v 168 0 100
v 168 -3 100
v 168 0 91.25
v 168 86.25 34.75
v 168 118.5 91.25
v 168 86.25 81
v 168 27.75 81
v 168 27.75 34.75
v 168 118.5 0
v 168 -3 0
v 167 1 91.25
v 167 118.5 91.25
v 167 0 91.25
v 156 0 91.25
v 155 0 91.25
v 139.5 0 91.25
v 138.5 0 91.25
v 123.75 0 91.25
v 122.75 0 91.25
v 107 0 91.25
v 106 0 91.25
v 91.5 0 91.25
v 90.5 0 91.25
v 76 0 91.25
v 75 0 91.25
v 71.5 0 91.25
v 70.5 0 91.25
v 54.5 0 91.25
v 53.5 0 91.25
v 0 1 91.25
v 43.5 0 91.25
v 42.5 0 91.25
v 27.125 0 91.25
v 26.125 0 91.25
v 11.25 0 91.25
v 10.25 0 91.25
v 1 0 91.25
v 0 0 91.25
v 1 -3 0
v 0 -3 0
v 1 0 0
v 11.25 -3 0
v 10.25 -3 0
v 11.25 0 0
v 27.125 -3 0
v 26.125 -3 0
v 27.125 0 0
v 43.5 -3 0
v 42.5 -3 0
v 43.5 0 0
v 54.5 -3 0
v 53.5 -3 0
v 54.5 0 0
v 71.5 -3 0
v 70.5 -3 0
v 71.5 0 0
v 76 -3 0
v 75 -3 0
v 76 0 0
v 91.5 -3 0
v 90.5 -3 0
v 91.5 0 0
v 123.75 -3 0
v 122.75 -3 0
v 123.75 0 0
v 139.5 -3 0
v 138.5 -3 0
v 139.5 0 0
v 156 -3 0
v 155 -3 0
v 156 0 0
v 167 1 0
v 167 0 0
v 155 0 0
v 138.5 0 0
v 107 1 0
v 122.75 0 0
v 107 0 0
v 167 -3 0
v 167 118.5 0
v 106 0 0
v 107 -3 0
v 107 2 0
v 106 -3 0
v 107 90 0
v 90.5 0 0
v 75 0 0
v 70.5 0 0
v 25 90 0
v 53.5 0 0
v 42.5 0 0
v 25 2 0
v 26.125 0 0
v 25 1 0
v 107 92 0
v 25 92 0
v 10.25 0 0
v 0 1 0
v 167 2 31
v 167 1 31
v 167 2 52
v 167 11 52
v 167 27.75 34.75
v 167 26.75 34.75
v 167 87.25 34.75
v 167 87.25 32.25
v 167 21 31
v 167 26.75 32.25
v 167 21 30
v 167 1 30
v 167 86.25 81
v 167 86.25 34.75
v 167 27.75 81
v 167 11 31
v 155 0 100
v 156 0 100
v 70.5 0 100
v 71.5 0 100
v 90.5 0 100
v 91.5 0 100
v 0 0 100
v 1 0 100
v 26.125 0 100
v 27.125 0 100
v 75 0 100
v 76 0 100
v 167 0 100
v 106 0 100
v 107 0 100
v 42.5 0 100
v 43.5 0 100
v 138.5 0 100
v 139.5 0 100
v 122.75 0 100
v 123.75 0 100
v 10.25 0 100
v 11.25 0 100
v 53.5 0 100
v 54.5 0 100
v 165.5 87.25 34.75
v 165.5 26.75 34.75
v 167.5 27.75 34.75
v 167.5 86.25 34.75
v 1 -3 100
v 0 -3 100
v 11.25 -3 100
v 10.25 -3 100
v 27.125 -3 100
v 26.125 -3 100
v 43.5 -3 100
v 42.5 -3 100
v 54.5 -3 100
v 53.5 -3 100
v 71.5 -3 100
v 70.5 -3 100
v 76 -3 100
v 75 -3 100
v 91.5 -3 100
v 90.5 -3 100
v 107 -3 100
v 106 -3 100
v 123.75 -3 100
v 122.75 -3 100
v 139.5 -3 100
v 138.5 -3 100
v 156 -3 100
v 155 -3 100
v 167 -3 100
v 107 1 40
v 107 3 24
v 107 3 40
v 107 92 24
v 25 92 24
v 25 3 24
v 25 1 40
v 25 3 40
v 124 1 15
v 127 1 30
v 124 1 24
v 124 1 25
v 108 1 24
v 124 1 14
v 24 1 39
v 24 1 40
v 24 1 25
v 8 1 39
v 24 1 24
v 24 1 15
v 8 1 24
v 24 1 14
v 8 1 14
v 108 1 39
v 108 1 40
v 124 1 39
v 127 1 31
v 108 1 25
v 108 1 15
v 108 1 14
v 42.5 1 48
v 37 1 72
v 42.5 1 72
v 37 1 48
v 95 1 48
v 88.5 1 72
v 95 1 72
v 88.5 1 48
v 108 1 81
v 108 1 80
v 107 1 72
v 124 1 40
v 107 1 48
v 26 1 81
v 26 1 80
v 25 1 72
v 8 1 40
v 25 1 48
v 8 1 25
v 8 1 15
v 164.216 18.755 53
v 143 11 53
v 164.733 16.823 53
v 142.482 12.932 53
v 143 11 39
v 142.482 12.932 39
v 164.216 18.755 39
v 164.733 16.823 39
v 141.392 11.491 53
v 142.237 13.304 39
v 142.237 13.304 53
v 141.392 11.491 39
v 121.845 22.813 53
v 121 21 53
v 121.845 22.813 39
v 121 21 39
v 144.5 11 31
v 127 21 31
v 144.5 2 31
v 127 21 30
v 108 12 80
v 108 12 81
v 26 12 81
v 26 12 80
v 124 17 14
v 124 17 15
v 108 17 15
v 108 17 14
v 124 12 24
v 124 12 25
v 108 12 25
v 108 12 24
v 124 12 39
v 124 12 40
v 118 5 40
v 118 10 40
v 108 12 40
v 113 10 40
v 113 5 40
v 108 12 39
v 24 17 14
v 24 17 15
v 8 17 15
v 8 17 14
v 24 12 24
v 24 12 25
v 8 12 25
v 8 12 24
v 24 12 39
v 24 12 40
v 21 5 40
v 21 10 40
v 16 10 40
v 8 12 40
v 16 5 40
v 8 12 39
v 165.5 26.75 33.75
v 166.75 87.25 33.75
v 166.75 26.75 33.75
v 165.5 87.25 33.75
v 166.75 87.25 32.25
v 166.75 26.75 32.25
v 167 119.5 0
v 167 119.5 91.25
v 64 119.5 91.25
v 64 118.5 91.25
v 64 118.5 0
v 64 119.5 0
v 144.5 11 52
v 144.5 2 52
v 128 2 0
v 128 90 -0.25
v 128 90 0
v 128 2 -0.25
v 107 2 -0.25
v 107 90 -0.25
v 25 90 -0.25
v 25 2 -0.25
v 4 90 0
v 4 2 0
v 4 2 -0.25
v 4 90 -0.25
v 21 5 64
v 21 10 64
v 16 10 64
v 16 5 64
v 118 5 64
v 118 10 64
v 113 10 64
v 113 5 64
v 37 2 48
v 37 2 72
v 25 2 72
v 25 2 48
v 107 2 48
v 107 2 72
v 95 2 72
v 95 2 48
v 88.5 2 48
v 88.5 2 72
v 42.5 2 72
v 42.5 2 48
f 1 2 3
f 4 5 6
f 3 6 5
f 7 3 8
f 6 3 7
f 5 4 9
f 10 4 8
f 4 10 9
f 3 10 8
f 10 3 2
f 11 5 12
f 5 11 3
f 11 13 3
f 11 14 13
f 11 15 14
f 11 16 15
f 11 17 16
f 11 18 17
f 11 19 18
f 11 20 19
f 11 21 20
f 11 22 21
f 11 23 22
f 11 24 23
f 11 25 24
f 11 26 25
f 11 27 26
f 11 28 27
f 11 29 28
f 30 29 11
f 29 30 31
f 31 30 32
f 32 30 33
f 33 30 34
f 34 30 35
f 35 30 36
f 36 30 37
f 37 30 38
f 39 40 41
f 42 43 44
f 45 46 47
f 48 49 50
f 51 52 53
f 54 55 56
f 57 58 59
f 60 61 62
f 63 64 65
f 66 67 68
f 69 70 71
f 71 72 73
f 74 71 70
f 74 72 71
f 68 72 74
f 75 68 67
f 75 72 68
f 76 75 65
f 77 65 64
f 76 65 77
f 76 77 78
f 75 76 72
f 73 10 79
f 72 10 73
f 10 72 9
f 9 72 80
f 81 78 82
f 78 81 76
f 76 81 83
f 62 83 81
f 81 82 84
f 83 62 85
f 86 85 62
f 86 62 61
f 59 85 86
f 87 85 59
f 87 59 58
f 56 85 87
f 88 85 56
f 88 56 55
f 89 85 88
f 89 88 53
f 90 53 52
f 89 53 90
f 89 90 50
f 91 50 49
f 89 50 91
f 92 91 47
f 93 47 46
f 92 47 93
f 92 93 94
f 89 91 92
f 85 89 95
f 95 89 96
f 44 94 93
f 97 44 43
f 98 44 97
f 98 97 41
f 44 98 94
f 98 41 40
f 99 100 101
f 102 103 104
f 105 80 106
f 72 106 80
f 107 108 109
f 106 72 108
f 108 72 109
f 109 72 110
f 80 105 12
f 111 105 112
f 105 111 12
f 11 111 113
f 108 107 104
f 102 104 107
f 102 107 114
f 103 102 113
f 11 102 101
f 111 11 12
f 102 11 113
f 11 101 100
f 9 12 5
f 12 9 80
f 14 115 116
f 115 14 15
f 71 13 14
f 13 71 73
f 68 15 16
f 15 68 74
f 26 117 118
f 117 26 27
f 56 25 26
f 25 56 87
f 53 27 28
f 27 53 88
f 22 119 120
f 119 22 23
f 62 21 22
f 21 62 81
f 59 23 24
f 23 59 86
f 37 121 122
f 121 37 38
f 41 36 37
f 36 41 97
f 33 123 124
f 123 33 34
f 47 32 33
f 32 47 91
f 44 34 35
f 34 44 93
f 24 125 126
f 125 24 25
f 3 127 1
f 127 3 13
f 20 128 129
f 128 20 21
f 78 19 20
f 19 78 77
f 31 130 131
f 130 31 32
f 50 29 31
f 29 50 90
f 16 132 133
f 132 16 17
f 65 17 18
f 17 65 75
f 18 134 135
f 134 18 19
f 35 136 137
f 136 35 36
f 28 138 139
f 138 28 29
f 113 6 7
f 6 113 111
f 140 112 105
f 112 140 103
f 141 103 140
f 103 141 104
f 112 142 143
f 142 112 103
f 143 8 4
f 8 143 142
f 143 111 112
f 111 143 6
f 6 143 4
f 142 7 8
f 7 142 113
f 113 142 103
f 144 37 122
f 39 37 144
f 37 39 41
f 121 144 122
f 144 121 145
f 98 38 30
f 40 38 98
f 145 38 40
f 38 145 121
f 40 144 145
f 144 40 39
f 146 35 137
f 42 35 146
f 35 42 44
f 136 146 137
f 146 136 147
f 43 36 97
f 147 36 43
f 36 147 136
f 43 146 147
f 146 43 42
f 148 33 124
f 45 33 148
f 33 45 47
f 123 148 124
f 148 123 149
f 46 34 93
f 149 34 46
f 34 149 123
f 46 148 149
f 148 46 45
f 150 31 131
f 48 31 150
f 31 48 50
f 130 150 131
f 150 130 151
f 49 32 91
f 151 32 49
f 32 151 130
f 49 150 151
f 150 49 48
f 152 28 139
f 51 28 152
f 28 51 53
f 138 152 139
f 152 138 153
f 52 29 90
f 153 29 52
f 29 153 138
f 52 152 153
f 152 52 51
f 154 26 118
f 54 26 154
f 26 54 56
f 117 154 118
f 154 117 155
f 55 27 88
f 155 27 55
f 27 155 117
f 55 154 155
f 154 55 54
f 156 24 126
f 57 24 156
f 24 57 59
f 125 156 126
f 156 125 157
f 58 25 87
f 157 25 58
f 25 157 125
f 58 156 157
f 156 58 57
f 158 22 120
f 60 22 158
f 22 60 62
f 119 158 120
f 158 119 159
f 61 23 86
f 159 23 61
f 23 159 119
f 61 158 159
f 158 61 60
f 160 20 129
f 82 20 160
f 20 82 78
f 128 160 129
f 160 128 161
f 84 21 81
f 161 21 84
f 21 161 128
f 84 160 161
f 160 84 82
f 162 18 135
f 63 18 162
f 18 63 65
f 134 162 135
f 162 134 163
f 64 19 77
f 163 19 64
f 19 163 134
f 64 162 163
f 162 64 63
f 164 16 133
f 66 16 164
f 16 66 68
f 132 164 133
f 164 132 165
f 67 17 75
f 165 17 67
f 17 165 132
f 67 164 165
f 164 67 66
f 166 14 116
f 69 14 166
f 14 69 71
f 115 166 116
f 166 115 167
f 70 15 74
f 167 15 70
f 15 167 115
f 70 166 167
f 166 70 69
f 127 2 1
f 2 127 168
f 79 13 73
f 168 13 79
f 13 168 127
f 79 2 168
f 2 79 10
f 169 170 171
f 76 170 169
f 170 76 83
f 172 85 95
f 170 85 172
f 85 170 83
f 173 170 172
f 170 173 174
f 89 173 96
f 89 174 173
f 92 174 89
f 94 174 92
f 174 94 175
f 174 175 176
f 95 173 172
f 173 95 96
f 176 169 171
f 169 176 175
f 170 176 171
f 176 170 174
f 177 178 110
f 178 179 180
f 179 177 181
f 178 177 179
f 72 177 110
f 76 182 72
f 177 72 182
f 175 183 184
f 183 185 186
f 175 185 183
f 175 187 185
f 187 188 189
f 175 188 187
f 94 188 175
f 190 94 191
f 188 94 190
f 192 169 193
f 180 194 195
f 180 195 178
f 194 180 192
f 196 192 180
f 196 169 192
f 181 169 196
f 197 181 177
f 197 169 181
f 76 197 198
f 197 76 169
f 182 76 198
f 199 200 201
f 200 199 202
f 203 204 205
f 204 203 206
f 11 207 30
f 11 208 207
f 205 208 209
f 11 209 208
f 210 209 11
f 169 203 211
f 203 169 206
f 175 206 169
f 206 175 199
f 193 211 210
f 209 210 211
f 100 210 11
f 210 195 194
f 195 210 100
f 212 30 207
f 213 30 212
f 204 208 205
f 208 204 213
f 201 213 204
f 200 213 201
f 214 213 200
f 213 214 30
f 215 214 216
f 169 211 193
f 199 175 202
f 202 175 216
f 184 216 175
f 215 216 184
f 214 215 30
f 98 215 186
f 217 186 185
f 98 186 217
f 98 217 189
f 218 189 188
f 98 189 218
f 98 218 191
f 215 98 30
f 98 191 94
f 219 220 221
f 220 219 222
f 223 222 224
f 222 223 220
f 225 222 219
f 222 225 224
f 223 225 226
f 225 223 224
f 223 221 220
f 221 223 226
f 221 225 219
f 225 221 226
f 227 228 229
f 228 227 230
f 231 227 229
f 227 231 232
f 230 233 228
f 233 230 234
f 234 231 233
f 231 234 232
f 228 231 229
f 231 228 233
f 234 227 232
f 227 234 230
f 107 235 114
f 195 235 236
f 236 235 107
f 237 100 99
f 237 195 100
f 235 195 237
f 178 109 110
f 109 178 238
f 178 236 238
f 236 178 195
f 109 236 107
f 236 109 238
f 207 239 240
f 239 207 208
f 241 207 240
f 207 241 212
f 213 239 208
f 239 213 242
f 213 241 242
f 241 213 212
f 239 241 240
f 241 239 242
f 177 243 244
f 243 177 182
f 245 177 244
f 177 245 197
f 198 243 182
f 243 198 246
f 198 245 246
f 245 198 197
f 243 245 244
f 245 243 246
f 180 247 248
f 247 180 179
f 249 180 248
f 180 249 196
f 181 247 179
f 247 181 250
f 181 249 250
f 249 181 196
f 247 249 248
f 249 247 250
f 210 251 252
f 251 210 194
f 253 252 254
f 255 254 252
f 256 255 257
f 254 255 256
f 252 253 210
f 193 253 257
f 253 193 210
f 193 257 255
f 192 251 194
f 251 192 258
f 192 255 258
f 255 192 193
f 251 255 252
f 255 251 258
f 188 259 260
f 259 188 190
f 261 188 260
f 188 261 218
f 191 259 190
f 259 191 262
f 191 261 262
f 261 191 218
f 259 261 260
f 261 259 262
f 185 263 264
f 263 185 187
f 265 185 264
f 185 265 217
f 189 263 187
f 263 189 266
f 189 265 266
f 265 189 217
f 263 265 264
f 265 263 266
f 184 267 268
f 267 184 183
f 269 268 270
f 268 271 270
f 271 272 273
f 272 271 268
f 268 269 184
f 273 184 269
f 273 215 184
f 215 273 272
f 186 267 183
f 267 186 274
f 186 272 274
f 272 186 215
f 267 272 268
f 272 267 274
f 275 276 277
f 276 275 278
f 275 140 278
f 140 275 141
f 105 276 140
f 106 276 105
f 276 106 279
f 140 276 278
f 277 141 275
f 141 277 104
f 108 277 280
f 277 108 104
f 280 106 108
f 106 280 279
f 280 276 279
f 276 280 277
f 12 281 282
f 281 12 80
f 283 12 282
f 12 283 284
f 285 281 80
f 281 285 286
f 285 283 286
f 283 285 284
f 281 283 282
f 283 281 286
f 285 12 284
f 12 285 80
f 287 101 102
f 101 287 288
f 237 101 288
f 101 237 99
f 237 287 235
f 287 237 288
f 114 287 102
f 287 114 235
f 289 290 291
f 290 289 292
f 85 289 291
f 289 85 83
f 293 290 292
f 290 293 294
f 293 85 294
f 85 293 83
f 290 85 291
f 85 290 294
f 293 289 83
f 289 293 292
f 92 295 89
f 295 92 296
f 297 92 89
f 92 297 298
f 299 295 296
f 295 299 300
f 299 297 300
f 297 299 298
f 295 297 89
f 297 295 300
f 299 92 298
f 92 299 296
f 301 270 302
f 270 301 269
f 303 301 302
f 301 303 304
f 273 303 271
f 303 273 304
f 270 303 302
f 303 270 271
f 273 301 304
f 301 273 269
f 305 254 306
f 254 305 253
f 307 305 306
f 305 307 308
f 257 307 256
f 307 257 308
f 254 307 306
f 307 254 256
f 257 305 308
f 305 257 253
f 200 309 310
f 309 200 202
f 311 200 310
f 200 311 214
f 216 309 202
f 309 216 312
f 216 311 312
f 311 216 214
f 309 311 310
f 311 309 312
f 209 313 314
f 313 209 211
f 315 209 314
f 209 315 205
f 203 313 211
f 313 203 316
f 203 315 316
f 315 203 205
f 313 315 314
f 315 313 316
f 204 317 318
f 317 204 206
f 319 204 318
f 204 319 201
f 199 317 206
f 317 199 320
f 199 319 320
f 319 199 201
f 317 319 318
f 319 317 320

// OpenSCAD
 wallLength = 82+60+25;

module stud (distance){            
    translate([distance,-3,0]) cube([1,3,100]);
}


module studs(){
    stud(0);
    stud(10.25);
    stud(26.125);
    stud(42.5);
    stud(53.5);
    stud(70.5);
    stud(75);
    stud(90.5);    
    stud(106);
    stud(wallLength - 44.25);
    stud(wallLength - 28.5);
    stud(wallLength - 12);
    stud(wallLength);
}

module brace(vert, horiz){    
    l = 1;
    w = 9;
    h = 6.5;
    translate([horiz,1,vert-h]){        
        polyhedron(
           points=[[0,0,0], [l,0,0], [0,0,h], [l,0,h], [0,w,h], [l,w,h]],
           faces=[[0,2,4],[1,3,5], [0,1,5,4],[3,4,5],[4,2,3]]
        );
    }; 
}

module monitors(){   
    translate([wallLength-22,9,39]) rotate([0,0,15]) cube([22.5, 2, 14]);
    translate([wallLength-46+2,19,39]) rotate([0,0,-25]) cube([22.5, 2, 14]);   
}
module shelf(vert, horiz, depth, width){    
    translate([horiz,1,vert]) cube([width, depth, 1]); 
    brace(vert, horiz);
    brace(vert, horiz+width-1);
}
module wall(){
   cube([82+60+25, 1, 91.25]);
}
module bed(){
    translate([25,0,0]) cube([82, 92, 24]);
    translate([25,1,0]) cube([82, 2, 40]);
}

//outer wall
outerwall = 64+54.5;
difference(){
    translate([wallLength,0,0]) cube([1,outerwall,91.25]);
    translate([wallLength-1,27.75,34.75]) cube([3,58.5,46.25]);
};
translate([wallLength-1.5,27.75-1,34.75-1]) cube([2,60.5,1]);
translate([wallLength-.25,27.75-1,34.75-2.5]) cube([.25,60.5,1.5]);

//opposite wall
translate([wallLength - 103,outerwall,0]) cube([103,1,91.25]);
//computer
translate([wallLength,2,31]) rotate(90,0,0) cube([9,22.5,21]);

studs();
wall();
bed();
translate([-2,2,0]) monitors();

//floor
translate([82+25,2,-.25]) cube([21,88,.25]);
translate([4,2,-.25]) cube([21,88,.25]);

//des

//desk
shelf(30, wallLength -40,20,40);
brace(30, wallLength -28);
brace(30, wallLength -12);

//big shelf
shelf(80,26,11,82);
brace(80,42);
brace(80,90.5);

//left bedside
shelf(14, 82+25+1,16,16);
shelf(24, 82+25+1,11,16);
shelf(39, 82+25+1,11,16);
//right bedside
shelf(14, 08,16,16);
shelf(24, 08,11,16);
shelf(39, 08,11,16);

//lamps
translate([16,5,40]) cube([5, 5, 24]);
translate([25+82+6,5,40]) cube([5, 5, 24]);

//paintings
translate([25,1,48]) cube([12, 1, 24]);
translate([25+82-12,1,48]) cube([12, 1, 24]);

//big damn frame
translate([25+17.5,1,48]) cube([46, 1, 24]);
